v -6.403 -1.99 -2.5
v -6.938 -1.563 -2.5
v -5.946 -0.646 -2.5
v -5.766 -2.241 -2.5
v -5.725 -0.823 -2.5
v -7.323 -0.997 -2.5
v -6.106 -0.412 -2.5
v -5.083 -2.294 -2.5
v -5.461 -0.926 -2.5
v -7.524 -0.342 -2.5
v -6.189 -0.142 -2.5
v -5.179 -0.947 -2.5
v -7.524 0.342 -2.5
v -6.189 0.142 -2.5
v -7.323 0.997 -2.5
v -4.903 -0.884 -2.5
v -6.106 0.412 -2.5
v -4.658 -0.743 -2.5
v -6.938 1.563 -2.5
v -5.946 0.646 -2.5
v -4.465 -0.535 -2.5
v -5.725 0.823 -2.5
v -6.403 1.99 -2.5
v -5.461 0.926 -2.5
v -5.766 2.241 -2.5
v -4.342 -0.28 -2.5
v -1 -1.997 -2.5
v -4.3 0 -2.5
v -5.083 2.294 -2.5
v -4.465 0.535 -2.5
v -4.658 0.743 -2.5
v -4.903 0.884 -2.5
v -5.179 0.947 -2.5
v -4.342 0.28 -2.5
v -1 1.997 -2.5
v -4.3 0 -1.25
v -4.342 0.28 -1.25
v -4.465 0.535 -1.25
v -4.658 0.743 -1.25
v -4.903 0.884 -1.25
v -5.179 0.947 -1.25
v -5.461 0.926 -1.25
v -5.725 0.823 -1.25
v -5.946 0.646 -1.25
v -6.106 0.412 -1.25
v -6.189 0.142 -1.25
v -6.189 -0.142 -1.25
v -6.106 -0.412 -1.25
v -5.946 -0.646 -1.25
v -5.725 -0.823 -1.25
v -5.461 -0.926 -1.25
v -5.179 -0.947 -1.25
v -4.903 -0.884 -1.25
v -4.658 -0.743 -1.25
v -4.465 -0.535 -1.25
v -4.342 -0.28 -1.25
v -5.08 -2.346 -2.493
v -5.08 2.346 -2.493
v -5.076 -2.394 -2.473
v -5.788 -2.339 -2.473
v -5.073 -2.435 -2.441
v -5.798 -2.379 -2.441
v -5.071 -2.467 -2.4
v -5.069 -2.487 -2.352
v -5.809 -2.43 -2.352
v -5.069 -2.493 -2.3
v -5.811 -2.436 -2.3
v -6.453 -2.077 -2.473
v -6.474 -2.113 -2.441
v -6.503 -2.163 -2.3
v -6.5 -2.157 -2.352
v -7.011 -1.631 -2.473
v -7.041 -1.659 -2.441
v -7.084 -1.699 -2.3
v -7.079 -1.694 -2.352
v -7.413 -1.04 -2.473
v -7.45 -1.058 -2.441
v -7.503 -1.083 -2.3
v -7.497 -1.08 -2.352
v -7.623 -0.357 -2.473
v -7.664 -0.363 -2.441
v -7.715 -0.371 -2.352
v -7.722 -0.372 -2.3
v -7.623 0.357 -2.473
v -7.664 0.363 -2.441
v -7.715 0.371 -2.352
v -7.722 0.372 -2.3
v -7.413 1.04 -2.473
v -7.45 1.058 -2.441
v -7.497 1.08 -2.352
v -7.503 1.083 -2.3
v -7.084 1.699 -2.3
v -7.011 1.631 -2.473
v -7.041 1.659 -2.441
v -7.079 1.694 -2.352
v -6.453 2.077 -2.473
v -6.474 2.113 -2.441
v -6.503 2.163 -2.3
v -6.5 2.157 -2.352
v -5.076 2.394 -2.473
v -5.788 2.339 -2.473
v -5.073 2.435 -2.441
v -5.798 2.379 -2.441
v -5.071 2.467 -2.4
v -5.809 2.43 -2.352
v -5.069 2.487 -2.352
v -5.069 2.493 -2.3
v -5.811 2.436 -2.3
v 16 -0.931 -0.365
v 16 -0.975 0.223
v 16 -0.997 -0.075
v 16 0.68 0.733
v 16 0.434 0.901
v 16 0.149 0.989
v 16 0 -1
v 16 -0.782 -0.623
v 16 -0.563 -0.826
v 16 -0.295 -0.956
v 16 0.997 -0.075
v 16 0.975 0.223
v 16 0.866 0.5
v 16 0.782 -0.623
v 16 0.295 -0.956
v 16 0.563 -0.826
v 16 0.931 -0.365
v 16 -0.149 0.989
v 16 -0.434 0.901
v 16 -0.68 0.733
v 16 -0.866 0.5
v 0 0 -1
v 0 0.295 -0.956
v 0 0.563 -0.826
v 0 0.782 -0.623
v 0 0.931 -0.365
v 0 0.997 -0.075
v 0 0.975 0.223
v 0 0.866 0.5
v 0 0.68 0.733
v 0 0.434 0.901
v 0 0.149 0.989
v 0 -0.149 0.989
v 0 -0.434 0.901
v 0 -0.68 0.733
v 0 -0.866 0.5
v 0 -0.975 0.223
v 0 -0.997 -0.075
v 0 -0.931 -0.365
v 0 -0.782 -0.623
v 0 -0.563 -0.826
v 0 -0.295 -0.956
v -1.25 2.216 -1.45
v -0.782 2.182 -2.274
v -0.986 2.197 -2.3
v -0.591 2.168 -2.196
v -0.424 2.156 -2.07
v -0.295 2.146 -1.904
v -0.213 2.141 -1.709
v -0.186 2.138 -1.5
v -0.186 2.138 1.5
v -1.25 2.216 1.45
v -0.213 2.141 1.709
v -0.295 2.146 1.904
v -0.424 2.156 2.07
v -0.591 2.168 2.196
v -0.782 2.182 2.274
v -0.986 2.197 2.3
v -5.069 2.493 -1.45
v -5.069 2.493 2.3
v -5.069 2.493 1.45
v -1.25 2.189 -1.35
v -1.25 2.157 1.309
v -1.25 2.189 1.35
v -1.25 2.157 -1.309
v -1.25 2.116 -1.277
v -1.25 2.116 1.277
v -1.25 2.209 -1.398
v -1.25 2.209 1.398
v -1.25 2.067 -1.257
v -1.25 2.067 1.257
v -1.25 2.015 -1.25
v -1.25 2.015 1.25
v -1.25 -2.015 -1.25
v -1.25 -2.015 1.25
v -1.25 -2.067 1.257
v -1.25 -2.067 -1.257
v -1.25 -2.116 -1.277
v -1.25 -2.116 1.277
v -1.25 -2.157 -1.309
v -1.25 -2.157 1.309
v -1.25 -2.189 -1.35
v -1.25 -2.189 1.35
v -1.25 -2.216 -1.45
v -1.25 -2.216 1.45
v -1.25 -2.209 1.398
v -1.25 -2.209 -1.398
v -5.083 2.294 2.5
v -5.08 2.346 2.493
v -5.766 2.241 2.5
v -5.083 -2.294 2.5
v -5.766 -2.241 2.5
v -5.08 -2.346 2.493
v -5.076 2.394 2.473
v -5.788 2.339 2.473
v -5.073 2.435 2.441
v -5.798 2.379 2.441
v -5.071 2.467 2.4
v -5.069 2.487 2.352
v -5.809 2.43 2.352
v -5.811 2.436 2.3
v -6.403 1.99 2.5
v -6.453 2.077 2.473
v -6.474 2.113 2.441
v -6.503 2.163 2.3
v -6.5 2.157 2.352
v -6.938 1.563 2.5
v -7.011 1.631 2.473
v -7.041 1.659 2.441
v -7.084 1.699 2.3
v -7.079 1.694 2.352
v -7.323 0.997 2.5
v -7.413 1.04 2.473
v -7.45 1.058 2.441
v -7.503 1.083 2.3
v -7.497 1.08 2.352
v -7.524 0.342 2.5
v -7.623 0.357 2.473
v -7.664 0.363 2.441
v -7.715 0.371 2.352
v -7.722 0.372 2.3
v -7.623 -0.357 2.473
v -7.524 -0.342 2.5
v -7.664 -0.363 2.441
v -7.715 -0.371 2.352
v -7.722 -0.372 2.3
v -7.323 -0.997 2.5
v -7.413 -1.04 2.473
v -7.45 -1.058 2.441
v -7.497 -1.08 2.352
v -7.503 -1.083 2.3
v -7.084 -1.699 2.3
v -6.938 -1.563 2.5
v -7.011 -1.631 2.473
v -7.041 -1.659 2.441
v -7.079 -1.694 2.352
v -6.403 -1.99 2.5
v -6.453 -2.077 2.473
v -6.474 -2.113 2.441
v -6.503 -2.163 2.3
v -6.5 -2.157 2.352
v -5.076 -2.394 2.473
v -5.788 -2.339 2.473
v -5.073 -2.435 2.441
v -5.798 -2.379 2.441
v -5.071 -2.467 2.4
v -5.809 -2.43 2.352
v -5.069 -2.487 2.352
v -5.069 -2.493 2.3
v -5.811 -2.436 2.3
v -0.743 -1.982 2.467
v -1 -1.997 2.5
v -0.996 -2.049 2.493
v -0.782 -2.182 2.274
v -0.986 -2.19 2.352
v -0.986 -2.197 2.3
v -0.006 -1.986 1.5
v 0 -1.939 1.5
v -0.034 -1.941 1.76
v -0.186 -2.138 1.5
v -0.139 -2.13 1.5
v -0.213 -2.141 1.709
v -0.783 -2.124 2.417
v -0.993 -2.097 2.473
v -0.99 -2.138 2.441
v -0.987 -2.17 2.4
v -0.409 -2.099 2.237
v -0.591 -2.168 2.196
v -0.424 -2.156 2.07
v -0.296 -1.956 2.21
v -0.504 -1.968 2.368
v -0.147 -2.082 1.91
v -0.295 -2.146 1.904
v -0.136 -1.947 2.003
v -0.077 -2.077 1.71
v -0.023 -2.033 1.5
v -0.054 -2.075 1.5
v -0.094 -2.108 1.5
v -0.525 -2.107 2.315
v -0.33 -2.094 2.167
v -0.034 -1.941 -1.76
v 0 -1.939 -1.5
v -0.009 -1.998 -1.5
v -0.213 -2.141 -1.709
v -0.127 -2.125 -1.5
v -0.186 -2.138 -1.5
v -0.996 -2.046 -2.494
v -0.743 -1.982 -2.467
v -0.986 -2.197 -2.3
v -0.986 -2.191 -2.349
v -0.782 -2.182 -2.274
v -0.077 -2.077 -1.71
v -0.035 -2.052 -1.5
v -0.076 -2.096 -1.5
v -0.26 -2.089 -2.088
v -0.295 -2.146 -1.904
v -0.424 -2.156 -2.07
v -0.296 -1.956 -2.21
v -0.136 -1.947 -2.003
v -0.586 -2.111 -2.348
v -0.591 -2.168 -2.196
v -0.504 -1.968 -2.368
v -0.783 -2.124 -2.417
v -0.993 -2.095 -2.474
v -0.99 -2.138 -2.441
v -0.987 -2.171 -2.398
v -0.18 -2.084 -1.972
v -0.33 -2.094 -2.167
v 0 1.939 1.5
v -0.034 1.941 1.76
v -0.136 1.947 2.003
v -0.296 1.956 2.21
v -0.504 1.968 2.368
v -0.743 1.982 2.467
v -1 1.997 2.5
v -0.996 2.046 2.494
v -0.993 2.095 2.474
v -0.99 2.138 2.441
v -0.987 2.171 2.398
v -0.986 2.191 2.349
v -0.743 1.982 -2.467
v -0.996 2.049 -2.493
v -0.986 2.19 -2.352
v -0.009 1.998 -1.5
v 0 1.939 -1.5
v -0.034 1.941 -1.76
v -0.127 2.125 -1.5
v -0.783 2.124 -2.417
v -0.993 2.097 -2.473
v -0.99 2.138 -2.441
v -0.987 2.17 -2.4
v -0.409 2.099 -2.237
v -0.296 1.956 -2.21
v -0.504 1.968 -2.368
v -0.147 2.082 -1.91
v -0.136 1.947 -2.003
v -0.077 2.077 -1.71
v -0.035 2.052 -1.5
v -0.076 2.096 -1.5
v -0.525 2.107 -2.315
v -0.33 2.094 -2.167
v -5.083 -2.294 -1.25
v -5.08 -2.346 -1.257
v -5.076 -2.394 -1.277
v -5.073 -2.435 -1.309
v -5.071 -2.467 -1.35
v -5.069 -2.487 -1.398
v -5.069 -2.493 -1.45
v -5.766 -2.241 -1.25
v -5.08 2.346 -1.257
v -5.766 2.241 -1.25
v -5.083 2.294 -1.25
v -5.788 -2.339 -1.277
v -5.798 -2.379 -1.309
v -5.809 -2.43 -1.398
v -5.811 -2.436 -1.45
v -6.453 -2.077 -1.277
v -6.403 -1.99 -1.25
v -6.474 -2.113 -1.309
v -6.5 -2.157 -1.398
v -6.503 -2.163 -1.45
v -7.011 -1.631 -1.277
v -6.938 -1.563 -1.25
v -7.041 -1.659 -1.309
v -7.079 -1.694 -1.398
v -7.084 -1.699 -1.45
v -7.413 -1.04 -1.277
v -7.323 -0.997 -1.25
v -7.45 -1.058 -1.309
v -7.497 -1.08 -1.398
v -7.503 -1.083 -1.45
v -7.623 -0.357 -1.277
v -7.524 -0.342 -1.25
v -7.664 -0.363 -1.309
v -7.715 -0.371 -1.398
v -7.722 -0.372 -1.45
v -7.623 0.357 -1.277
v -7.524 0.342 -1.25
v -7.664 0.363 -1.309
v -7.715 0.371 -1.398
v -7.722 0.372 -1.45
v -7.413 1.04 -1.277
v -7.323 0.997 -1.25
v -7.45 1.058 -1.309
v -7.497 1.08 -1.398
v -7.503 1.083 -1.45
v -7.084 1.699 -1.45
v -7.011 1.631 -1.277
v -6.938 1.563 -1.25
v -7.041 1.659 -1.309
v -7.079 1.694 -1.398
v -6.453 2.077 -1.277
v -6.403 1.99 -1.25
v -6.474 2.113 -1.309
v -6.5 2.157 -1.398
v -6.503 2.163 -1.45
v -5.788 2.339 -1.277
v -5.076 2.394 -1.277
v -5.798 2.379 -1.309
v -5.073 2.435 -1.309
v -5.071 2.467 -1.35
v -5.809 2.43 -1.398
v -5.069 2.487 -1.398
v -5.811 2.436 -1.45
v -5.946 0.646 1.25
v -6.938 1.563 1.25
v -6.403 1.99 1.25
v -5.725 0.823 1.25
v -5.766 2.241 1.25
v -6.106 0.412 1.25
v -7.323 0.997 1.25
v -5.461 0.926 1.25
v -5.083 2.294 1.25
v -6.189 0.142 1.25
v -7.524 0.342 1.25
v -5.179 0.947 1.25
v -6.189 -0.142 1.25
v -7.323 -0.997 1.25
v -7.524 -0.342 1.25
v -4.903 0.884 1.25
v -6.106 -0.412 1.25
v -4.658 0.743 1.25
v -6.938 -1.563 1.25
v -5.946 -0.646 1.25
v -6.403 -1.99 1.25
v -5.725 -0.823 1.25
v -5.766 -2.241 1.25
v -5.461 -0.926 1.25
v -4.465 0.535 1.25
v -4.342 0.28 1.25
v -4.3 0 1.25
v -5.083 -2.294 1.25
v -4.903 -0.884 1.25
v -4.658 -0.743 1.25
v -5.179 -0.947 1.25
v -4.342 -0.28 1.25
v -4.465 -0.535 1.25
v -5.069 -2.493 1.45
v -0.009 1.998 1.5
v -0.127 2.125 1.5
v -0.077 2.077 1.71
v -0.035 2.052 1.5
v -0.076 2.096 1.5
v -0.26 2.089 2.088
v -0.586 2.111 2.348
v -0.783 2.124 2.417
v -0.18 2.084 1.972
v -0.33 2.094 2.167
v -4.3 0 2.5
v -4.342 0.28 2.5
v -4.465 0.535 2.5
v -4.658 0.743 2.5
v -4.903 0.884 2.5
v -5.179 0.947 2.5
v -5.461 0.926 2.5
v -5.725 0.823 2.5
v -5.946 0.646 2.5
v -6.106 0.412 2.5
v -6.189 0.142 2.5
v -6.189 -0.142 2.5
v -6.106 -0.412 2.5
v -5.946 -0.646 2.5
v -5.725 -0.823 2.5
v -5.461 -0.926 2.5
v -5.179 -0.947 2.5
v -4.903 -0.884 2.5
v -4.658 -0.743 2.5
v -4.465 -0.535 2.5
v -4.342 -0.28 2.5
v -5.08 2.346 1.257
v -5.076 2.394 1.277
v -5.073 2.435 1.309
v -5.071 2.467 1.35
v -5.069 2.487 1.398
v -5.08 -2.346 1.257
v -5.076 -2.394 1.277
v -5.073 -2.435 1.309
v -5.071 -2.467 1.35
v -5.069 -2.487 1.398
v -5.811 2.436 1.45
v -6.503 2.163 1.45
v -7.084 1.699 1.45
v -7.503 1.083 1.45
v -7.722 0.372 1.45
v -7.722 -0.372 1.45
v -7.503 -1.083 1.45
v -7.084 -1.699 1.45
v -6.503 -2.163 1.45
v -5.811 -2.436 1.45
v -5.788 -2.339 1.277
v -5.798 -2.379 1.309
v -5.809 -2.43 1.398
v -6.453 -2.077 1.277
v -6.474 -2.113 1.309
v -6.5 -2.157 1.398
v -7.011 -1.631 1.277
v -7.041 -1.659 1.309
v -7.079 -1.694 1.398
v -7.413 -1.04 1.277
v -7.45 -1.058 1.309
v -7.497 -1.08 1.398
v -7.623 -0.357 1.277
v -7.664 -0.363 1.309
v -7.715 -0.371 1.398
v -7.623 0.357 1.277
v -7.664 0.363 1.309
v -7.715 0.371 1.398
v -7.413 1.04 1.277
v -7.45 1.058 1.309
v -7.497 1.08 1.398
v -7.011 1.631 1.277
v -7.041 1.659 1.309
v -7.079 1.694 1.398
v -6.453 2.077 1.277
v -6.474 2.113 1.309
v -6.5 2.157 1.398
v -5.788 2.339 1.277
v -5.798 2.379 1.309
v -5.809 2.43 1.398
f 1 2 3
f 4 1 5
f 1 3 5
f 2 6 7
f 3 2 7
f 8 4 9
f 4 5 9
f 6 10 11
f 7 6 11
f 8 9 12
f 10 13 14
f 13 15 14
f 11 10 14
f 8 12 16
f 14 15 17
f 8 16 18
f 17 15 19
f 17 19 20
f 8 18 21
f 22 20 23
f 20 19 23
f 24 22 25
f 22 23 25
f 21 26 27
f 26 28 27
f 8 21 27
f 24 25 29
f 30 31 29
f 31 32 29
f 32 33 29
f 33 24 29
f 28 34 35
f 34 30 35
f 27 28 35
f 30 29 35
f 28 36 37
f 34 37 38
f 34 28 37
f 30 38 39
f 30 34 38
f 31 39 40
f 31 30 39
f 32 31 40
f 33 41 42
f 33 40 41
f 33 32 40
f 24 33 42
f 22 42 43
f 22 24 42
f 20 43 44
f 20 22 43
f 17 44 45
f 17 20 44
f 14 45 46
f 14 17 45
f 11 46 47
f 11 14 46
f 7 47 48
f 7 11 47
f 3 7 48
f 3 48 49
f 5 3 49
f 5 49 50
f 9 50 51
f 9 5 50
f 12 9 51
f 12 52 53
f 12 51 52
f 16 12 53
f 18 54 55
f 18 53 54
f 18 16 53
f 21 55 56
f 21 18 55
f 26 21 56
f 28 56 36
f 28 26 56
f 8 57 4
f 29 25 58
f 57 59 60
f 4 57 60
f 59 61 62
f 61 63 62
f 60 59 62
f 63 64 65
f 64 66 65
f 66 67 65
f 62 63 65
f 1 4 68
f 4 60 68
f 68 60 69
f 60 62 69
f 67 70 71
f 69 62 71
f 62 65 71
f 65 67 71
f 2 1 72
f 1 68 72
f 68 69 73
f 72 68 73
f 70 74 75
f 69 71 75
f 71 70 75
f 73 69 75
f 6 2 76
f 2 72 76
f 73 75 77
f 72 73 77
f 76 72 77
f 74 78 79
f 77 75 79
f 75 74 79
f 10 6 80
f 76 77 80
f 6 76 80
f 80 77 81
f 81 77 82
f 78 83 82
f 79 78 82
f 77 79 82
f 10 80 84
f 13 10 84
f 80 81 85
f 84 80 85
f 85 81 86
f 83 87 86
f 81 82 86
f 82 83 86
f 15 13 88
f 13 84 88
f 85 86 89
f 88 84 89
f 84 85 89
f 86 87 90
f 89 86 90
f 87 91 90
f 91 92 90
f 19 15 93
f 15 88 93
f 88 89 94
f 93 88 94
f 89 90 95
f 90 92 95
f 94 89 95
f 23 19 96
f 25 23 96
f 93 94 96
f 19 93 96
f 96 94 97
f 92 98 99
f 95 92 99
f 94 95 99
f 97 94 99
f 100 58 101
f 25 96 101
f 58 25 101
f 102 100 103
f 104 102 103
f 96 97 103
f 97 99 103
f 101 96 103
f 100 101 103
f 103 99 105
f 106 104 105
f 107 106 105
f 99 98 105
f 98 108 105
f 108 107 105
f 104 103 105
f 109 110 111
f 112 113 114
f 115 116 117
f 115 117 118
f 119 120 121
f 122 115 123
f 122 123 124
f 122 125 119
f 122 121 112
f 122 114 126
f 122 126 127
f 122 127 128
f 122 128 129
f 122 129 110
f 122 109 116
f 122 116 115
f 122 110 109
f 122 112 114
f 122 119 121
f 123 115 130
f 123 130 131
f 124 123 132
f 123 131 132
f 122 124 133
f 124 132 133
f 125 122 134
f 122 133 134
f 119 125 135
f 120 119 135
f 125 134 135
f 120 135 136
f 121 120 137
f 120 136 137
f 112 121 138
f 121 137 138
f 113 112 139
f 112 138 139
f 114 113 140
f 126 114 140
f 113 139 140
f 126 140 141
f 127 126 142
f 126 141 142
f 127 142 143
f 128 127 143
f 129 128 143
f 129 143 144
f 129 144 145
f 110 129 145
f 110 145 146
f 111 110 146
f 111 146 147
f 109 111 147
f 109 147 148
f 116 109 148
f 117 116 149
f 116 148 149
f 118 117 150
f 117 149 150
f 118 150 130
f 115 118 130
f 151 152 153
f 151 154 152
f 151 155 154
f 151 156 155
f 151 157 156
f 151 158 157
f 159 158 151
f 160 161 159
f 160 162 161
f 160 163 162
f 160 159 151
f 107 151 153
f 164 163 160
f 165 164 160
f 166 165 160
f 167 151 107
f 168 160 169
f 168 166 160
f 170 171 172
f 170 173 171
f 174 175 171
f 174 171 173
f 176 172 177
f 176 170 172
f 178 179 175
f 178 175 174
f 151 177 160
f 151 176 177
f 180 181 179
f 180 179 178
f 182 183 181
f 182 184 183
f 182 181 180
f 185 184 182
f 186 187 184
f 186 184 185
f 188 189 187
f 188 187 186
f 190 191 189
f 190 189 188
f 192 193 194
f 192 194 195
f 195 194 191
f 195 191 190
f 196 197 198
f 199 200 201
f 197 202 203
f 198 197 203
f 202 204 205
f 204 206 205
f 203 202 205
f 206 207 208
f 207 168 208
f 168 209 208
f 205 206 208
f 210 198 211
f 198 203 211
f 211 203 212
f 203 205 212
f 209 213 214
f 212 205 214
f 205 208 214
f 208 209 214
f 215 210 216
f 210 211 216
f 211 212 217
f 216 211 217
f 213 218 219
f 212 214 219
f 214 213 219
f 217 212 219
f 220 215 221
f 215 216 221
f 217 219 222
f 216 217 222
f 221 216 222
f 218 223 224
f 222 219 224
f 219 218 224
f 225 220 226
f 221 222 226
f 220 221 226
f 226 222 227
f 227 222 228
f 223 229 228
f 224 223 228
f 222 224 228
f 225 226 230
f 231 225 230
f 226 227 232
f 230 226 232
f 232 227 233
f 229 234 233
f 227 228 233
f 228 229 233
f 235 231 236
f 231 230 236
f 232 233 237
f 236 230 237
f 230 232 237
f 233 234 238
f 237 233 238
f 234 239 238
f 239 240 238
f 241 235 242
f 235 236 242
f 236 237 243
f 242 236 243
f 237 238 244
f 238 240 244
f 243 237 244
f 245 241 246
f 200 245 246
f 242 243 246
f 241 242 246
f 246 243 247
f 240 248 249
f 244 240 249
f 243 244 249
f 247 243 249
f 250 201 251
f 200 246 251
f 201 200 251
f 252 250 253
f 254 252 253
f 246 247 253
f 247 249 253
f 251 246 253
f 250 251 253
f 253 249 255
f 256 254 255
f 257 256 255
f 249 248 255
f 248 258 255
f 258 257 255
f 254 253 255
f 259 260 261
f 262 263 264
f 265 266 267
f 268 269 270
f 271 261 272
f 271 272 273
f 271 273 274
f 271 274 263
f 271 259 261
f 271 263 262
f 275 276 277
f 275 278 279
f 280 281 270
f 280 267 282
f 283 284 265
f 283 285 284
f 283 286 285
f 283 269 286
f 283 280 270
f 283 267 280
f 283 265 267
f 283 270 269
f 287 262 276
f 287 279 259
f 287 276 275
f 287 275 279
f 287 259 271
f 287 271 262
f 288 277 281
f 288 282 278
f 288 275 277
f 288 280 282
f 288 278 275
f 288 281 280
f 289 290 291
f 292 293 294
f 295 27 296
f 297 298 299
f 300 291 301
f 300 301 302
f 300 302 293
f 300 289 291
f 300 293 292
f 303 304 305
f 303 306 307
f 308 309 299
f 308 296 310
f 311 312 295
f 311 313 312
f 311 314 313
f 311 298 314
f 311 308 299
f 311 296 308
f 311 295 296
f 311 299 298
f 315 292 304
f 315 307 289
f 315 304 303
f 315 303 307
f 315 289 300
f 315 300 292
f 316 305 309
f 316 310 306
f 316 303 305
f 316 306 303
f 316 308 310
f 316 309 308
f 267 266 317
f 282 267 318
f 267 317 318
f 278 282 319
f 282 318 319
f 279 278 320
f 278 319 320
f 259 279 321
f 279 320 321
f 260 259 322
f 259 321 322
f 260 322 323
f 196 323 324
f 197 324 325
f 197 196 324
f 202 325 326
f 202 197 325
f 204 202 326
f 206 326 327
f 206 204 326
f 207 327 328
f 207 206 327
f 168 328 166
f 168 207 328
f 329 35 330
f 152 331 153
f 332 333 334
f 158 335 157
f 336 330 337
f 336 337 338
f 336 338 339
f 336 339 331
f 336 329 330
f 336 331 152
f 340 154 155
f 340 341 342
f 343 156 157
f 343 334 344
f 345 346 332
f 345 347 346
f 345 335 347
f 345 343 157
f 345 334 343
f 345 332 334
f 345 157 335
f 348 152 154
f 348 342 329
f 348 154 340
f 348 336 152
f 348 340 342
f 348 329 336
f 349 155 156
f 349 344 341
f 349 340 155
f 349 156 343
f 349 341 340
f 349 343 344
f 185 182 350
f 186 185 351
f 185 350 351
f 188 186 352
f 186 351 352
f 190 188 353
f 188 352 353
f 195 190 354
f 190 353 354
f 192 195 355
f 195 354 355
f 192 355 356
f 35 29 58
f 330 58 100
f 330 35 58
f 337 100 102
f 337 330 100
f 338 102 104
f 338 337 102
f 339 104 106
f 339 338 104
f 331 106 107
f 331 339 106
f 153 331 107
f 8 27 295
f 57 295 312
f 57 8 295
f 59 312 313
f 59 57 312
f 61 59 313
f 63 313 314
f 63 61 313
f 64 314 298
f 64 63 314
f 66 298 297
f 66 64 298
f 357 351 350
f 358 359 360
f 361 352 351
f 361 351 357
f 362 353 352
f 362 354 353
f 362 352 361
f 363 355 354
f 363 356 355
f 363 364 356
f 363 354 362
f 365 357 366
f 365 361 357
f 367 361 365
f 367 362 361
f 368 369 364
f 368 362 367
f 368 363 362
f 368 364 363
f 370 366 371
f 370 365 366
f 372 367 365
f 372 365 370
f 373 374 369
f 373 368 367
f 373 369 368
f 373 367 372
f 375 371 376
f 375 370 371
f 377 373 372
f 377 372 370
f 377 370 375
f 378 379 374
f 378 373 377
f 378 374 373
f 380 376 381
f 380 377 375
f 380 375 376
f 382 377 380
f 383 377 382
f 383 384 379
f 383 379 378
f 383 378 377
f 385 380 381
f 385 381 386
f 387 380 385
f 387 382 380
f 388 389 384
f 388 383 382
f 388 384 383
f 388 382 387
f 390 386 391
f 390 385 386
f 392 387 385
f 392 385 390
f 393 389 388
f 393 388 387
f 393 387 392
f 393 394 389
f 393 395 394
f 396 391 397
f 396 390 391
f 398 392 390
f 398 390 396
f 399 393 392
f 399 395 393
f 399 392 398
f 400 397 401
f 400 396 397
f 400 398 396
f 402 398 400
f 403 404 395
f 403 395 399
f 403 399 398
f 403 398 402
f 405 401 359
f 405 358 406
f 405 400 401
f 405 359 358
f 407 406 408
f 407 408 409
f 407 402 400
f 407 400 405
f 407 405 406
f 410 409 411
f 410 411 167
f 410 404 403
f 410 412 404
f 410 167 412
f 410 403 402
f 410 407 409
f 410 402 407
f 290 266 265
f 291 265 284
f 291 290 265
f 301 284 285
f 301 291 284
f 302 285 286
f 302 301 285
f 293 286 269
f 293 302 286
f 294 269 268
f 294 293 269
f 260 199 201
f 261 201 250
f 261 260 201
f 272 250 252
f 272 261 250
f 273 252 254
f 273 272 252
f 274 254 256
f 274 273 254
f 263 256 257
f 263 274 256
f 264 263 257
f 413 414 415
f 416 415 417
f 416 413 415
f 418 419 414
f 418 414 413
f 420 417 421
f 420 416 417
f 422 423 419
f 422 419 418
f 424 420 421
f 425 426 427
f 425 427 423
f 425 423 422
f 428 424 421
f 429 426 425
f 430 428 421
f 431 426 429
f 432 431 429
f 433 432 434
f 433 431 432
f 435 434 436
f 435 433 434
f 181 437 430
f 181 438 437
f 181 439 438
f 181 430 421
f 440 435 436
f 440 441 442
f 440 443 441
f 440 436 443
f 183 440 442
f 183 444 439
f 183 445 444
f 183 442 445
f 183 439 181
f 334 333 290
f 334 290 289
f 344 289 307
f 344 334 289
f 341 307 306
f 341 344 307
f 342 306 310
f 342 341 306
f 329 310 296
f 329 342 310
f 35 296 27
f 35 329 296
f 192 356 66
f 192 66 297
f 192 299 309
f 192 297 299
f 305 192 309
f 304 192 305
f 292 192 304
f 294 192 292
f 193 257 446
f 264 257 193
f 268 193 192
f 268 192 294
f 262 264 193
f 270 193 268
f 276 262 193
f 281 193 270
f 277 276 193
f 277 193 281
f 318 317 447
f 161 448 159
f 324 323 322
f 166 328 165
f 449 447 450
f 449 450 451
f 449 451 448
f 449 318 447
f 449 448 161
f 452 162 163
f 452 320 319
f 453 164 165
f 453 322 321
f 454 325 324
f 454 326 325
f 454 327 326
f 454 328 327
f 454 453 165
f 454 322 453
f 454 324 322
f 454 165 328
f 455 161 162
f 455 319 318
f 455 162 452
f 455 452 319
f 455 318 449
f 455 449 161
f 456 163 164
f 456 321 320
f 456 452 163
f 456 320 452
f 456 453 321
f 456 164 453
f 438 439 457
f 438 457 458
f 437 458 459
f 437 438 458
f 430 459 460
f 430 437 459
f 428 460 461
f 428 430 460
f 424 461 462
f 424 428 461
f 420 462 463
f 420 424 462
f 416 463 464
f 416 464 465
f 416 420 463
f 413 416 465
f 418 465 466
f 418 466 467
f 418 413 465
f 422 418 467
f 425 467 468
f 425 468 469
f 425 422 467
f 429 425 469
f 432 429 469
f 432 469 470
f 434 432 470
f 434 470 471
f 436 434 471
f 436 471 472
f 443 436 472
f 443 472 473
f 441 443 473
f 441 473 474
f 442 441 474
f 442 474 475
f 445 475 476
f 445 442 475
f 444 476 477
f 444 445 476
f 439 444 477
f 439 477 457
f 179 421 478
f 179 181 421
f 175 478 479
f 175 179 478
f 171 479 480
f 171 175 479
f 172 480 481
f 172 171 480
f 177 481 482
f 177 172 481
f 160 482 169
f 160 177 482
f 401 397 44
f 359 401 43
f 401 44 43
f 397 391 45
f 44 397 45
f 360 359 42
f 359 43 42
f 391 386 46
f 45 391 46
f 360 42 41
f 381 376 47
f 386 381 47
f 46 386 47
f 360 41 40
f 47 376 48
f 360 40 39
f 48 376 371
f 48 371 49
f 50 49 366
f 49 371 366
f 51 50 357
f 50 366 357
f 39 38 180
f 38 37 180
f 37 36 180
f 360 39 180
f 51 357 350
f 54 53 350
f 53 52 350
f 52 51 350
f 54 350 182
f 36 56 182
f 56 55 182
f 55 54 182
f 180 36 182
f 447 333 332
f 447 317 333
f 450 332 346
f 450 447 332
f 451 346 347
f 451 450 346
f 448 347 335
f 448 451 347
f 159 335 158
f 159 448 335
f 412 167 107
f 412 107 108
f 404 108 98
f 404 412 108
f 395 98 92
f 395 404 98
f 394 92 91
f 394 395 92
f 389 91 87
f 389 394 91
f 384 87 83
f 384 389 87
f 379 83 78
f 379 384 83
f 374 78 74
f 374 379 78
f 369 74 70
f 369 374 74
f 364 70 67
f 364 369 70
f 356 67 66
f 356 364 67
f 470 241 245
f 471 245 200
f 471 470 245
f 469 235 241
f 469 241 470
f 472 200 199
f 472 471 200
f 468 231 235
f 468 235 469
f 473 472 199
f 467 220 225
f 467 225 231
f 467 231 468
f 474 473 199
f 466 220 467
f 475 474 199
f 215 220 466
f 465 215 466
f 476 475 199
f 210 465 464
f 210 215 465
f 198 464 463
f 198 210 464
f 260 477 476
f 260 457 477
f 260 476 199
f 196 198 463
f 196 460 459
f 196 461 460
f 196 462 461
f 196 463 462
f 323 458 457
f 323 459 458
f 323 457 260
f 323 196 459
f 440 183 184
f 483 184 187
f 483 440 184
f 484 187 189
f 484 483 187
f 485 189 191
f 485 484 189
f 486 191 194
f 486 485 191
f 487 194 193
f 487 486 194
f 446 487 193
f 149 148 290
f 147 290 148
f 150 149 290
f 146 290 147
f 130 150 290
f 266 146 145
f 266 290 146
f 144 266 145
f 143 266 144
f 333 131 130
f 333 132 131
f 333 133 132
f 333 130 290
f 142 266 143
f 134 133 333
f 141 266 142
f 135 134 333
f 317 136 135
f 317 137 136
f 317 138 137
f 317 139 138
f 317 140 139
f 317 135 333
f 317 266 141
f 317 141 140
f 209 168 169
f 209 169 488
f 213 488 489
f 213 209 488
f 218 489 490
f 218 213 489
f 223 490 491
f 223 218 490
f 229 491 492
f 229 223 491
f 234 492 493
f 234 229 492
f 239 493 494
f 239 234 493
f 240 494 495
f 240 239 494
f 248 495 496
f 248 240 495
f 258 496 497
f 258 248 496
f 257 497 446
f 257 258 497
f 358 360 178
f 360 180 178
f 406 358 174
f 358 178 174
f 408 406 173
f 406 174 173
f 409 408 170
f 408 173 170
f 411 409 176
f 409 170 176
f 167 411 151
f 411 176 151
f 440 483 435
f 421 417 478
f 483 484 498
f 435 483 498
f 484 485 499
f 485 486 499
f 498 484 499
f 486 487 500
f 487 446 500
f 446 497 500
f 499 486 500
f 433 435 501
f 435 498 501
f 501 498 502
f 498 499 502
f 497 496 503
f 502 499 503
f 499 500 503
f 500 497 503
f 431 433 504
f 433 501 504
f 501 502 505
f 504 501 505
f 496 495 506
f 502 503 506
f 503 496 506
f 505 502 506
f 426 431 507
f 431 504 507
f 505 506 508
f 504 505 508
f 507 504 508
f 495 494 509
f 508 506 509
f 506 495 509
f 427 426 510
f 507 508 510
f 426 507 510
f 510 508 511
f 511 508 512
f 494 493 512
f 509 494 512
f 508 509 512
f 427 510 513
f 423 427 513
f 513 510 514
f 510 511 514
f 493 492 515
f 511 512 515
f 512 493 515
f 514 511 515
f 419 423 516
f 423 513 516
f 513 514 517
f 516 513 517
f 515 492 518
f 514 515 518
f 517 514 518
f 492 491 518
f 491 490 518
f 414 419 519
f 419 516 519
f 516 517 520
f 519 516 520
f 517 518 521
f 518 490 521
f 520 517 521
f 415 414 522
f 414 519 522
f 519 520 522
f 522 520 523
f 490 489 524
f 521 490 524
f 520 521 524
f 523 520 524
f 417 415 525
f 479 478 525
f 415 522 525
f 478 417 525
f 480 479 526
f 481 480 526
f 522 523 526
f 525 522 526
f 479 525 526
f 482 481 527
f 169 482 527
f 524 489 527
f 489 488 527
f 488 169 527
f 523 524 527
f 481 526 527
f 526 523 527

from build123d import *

# Parameters (mm, degrees)
SKETCH2_R               = 1
BOSS_EXTRUDE1_DEPTH     = 16
SKETCH3_R               = 0.95
BOSS_EXTRUDE2_DEPTH     = 2.5
CUT_EXTRUDE1_DEPTH      = 17.385969608
CUT_EXTRUDE1_DEPTH_BACK = 17.385969608
SKETCH4_W               = 6.5
SKETCH4_H               = 2.5
FILLET1_R               = 1
FILLET2_R               = 0.2
FILLET3_R               = 0.2
FILLET4_R               = 0.2


with BuildPart() as part:
    # Sketch2 → Boss-Extrude1 (new body)
    with BuildSketch(Plane(origin=(0, 0, 0), x_dir=(0, 0, -1), z_dir=(1, 0, 0))):
        Circle(SKETCH2_R)
    extrude(amount=BOSS_EXTRUDE1_DEPTH)

    # Sketch3 → Boss-Extrude2 (add, symmetric)
    with BuildSketch(Plane.XY):
        with BuildLine():
            Line((0, -2.125), (0, 2.125))
            Line((0, 2.125), (-5.06876613, 2.493422203))
            ThreePointArc((-5.06876613, 2.493422203), (-7.75, 0), (-5.06876613, -2.493422203))
            Line((-5.06876613, -2.493422203), (0, -2.125))
        make_face()
        with Locations((-5.25, 0)):
            Circle(SKETCH3_R, mode=Mode.SUBTRACT)
    extrude(amount=BOSS_EXTRUDE2_DEPTH, both=True)

    # Sketch4 → Cut-Extrude1 (cut, two sides: drawn at the far end of the back side and taken through both)
    with BuildSketch(Plane(origin=(0, 0, 0), x_dir=(1, 0, 0), z_dir=(0, 1, 0)).offset(-CUT_EXTRUDE1_DEPTH_BACK)):
        with Locations((-4.5, 0)):
            Rectangle(SKETCH4_W, SKETCH4_H)
    extrude(amount=CUT_EXTRUDE1_DEPTH + CUT_EXTRUDE1_DEPTH_BACK, mode=Mode.SUBTRACT)

    # Fillet1
    fillet1_edges = [part.edges().sort_by_distance(p)[0] for p in [
        (0, 0, 2.5),
        (0, 0, -2.5),
    ]]
    fillet(fillet1_edges, radius=FILLET1_R)

    # Fillet2
    fillet2_edges = [part.edges().sort_by_distance(p)[0] for p in [
        (0, 2.125, 0),
        (0, -2.125, 0),
        (-3.034383065, 2.345553497, 2.5),
        (-3.034383065, 2.345553497, -2.5),
        (-0.293359104, 2.146322745, 2.20757236),
        (-0.293359104, 2.146322745, -2.20757236),
        (-0.293359104, -2.146322745, 2.20757236),
        (-0.293359104, -2.146322745, -2.20757236),
        (-3.034383065, -2.345553497, 2.5),
        (-7.75, 0, 2.5),
        (-3.034383065, -2.345553497, -2.5),
        (-7.75, 0, -2.5),
    ]]
    fillet(fillet2_edges, radius=FILLET2_R)

    # Fillet3
    fillet3_edges = [part.edges().sort_by_distance(p)[0] for p in [
        (-7.75, 0, -1.25),
        (-3.159383065, 2.354639096, -1.25),
        (-3.159383065, -2.354639096, -1.25),
    ]]
    fillet(fillet3_edges, radius=FILLET3_R)

    # Fillet4
    fillet4_edges = [part.edges().sort_by_distance(p)[0] for p in [
        (-7.75, 0, 1.25),
        (-3.159383065, -2.354639096, 1.25),
        (-3.159383065, 2.354639096, 1.25),
    ]]
    fillet(fillet4_edges, radius=FILLET4_R)


solid = part.part
